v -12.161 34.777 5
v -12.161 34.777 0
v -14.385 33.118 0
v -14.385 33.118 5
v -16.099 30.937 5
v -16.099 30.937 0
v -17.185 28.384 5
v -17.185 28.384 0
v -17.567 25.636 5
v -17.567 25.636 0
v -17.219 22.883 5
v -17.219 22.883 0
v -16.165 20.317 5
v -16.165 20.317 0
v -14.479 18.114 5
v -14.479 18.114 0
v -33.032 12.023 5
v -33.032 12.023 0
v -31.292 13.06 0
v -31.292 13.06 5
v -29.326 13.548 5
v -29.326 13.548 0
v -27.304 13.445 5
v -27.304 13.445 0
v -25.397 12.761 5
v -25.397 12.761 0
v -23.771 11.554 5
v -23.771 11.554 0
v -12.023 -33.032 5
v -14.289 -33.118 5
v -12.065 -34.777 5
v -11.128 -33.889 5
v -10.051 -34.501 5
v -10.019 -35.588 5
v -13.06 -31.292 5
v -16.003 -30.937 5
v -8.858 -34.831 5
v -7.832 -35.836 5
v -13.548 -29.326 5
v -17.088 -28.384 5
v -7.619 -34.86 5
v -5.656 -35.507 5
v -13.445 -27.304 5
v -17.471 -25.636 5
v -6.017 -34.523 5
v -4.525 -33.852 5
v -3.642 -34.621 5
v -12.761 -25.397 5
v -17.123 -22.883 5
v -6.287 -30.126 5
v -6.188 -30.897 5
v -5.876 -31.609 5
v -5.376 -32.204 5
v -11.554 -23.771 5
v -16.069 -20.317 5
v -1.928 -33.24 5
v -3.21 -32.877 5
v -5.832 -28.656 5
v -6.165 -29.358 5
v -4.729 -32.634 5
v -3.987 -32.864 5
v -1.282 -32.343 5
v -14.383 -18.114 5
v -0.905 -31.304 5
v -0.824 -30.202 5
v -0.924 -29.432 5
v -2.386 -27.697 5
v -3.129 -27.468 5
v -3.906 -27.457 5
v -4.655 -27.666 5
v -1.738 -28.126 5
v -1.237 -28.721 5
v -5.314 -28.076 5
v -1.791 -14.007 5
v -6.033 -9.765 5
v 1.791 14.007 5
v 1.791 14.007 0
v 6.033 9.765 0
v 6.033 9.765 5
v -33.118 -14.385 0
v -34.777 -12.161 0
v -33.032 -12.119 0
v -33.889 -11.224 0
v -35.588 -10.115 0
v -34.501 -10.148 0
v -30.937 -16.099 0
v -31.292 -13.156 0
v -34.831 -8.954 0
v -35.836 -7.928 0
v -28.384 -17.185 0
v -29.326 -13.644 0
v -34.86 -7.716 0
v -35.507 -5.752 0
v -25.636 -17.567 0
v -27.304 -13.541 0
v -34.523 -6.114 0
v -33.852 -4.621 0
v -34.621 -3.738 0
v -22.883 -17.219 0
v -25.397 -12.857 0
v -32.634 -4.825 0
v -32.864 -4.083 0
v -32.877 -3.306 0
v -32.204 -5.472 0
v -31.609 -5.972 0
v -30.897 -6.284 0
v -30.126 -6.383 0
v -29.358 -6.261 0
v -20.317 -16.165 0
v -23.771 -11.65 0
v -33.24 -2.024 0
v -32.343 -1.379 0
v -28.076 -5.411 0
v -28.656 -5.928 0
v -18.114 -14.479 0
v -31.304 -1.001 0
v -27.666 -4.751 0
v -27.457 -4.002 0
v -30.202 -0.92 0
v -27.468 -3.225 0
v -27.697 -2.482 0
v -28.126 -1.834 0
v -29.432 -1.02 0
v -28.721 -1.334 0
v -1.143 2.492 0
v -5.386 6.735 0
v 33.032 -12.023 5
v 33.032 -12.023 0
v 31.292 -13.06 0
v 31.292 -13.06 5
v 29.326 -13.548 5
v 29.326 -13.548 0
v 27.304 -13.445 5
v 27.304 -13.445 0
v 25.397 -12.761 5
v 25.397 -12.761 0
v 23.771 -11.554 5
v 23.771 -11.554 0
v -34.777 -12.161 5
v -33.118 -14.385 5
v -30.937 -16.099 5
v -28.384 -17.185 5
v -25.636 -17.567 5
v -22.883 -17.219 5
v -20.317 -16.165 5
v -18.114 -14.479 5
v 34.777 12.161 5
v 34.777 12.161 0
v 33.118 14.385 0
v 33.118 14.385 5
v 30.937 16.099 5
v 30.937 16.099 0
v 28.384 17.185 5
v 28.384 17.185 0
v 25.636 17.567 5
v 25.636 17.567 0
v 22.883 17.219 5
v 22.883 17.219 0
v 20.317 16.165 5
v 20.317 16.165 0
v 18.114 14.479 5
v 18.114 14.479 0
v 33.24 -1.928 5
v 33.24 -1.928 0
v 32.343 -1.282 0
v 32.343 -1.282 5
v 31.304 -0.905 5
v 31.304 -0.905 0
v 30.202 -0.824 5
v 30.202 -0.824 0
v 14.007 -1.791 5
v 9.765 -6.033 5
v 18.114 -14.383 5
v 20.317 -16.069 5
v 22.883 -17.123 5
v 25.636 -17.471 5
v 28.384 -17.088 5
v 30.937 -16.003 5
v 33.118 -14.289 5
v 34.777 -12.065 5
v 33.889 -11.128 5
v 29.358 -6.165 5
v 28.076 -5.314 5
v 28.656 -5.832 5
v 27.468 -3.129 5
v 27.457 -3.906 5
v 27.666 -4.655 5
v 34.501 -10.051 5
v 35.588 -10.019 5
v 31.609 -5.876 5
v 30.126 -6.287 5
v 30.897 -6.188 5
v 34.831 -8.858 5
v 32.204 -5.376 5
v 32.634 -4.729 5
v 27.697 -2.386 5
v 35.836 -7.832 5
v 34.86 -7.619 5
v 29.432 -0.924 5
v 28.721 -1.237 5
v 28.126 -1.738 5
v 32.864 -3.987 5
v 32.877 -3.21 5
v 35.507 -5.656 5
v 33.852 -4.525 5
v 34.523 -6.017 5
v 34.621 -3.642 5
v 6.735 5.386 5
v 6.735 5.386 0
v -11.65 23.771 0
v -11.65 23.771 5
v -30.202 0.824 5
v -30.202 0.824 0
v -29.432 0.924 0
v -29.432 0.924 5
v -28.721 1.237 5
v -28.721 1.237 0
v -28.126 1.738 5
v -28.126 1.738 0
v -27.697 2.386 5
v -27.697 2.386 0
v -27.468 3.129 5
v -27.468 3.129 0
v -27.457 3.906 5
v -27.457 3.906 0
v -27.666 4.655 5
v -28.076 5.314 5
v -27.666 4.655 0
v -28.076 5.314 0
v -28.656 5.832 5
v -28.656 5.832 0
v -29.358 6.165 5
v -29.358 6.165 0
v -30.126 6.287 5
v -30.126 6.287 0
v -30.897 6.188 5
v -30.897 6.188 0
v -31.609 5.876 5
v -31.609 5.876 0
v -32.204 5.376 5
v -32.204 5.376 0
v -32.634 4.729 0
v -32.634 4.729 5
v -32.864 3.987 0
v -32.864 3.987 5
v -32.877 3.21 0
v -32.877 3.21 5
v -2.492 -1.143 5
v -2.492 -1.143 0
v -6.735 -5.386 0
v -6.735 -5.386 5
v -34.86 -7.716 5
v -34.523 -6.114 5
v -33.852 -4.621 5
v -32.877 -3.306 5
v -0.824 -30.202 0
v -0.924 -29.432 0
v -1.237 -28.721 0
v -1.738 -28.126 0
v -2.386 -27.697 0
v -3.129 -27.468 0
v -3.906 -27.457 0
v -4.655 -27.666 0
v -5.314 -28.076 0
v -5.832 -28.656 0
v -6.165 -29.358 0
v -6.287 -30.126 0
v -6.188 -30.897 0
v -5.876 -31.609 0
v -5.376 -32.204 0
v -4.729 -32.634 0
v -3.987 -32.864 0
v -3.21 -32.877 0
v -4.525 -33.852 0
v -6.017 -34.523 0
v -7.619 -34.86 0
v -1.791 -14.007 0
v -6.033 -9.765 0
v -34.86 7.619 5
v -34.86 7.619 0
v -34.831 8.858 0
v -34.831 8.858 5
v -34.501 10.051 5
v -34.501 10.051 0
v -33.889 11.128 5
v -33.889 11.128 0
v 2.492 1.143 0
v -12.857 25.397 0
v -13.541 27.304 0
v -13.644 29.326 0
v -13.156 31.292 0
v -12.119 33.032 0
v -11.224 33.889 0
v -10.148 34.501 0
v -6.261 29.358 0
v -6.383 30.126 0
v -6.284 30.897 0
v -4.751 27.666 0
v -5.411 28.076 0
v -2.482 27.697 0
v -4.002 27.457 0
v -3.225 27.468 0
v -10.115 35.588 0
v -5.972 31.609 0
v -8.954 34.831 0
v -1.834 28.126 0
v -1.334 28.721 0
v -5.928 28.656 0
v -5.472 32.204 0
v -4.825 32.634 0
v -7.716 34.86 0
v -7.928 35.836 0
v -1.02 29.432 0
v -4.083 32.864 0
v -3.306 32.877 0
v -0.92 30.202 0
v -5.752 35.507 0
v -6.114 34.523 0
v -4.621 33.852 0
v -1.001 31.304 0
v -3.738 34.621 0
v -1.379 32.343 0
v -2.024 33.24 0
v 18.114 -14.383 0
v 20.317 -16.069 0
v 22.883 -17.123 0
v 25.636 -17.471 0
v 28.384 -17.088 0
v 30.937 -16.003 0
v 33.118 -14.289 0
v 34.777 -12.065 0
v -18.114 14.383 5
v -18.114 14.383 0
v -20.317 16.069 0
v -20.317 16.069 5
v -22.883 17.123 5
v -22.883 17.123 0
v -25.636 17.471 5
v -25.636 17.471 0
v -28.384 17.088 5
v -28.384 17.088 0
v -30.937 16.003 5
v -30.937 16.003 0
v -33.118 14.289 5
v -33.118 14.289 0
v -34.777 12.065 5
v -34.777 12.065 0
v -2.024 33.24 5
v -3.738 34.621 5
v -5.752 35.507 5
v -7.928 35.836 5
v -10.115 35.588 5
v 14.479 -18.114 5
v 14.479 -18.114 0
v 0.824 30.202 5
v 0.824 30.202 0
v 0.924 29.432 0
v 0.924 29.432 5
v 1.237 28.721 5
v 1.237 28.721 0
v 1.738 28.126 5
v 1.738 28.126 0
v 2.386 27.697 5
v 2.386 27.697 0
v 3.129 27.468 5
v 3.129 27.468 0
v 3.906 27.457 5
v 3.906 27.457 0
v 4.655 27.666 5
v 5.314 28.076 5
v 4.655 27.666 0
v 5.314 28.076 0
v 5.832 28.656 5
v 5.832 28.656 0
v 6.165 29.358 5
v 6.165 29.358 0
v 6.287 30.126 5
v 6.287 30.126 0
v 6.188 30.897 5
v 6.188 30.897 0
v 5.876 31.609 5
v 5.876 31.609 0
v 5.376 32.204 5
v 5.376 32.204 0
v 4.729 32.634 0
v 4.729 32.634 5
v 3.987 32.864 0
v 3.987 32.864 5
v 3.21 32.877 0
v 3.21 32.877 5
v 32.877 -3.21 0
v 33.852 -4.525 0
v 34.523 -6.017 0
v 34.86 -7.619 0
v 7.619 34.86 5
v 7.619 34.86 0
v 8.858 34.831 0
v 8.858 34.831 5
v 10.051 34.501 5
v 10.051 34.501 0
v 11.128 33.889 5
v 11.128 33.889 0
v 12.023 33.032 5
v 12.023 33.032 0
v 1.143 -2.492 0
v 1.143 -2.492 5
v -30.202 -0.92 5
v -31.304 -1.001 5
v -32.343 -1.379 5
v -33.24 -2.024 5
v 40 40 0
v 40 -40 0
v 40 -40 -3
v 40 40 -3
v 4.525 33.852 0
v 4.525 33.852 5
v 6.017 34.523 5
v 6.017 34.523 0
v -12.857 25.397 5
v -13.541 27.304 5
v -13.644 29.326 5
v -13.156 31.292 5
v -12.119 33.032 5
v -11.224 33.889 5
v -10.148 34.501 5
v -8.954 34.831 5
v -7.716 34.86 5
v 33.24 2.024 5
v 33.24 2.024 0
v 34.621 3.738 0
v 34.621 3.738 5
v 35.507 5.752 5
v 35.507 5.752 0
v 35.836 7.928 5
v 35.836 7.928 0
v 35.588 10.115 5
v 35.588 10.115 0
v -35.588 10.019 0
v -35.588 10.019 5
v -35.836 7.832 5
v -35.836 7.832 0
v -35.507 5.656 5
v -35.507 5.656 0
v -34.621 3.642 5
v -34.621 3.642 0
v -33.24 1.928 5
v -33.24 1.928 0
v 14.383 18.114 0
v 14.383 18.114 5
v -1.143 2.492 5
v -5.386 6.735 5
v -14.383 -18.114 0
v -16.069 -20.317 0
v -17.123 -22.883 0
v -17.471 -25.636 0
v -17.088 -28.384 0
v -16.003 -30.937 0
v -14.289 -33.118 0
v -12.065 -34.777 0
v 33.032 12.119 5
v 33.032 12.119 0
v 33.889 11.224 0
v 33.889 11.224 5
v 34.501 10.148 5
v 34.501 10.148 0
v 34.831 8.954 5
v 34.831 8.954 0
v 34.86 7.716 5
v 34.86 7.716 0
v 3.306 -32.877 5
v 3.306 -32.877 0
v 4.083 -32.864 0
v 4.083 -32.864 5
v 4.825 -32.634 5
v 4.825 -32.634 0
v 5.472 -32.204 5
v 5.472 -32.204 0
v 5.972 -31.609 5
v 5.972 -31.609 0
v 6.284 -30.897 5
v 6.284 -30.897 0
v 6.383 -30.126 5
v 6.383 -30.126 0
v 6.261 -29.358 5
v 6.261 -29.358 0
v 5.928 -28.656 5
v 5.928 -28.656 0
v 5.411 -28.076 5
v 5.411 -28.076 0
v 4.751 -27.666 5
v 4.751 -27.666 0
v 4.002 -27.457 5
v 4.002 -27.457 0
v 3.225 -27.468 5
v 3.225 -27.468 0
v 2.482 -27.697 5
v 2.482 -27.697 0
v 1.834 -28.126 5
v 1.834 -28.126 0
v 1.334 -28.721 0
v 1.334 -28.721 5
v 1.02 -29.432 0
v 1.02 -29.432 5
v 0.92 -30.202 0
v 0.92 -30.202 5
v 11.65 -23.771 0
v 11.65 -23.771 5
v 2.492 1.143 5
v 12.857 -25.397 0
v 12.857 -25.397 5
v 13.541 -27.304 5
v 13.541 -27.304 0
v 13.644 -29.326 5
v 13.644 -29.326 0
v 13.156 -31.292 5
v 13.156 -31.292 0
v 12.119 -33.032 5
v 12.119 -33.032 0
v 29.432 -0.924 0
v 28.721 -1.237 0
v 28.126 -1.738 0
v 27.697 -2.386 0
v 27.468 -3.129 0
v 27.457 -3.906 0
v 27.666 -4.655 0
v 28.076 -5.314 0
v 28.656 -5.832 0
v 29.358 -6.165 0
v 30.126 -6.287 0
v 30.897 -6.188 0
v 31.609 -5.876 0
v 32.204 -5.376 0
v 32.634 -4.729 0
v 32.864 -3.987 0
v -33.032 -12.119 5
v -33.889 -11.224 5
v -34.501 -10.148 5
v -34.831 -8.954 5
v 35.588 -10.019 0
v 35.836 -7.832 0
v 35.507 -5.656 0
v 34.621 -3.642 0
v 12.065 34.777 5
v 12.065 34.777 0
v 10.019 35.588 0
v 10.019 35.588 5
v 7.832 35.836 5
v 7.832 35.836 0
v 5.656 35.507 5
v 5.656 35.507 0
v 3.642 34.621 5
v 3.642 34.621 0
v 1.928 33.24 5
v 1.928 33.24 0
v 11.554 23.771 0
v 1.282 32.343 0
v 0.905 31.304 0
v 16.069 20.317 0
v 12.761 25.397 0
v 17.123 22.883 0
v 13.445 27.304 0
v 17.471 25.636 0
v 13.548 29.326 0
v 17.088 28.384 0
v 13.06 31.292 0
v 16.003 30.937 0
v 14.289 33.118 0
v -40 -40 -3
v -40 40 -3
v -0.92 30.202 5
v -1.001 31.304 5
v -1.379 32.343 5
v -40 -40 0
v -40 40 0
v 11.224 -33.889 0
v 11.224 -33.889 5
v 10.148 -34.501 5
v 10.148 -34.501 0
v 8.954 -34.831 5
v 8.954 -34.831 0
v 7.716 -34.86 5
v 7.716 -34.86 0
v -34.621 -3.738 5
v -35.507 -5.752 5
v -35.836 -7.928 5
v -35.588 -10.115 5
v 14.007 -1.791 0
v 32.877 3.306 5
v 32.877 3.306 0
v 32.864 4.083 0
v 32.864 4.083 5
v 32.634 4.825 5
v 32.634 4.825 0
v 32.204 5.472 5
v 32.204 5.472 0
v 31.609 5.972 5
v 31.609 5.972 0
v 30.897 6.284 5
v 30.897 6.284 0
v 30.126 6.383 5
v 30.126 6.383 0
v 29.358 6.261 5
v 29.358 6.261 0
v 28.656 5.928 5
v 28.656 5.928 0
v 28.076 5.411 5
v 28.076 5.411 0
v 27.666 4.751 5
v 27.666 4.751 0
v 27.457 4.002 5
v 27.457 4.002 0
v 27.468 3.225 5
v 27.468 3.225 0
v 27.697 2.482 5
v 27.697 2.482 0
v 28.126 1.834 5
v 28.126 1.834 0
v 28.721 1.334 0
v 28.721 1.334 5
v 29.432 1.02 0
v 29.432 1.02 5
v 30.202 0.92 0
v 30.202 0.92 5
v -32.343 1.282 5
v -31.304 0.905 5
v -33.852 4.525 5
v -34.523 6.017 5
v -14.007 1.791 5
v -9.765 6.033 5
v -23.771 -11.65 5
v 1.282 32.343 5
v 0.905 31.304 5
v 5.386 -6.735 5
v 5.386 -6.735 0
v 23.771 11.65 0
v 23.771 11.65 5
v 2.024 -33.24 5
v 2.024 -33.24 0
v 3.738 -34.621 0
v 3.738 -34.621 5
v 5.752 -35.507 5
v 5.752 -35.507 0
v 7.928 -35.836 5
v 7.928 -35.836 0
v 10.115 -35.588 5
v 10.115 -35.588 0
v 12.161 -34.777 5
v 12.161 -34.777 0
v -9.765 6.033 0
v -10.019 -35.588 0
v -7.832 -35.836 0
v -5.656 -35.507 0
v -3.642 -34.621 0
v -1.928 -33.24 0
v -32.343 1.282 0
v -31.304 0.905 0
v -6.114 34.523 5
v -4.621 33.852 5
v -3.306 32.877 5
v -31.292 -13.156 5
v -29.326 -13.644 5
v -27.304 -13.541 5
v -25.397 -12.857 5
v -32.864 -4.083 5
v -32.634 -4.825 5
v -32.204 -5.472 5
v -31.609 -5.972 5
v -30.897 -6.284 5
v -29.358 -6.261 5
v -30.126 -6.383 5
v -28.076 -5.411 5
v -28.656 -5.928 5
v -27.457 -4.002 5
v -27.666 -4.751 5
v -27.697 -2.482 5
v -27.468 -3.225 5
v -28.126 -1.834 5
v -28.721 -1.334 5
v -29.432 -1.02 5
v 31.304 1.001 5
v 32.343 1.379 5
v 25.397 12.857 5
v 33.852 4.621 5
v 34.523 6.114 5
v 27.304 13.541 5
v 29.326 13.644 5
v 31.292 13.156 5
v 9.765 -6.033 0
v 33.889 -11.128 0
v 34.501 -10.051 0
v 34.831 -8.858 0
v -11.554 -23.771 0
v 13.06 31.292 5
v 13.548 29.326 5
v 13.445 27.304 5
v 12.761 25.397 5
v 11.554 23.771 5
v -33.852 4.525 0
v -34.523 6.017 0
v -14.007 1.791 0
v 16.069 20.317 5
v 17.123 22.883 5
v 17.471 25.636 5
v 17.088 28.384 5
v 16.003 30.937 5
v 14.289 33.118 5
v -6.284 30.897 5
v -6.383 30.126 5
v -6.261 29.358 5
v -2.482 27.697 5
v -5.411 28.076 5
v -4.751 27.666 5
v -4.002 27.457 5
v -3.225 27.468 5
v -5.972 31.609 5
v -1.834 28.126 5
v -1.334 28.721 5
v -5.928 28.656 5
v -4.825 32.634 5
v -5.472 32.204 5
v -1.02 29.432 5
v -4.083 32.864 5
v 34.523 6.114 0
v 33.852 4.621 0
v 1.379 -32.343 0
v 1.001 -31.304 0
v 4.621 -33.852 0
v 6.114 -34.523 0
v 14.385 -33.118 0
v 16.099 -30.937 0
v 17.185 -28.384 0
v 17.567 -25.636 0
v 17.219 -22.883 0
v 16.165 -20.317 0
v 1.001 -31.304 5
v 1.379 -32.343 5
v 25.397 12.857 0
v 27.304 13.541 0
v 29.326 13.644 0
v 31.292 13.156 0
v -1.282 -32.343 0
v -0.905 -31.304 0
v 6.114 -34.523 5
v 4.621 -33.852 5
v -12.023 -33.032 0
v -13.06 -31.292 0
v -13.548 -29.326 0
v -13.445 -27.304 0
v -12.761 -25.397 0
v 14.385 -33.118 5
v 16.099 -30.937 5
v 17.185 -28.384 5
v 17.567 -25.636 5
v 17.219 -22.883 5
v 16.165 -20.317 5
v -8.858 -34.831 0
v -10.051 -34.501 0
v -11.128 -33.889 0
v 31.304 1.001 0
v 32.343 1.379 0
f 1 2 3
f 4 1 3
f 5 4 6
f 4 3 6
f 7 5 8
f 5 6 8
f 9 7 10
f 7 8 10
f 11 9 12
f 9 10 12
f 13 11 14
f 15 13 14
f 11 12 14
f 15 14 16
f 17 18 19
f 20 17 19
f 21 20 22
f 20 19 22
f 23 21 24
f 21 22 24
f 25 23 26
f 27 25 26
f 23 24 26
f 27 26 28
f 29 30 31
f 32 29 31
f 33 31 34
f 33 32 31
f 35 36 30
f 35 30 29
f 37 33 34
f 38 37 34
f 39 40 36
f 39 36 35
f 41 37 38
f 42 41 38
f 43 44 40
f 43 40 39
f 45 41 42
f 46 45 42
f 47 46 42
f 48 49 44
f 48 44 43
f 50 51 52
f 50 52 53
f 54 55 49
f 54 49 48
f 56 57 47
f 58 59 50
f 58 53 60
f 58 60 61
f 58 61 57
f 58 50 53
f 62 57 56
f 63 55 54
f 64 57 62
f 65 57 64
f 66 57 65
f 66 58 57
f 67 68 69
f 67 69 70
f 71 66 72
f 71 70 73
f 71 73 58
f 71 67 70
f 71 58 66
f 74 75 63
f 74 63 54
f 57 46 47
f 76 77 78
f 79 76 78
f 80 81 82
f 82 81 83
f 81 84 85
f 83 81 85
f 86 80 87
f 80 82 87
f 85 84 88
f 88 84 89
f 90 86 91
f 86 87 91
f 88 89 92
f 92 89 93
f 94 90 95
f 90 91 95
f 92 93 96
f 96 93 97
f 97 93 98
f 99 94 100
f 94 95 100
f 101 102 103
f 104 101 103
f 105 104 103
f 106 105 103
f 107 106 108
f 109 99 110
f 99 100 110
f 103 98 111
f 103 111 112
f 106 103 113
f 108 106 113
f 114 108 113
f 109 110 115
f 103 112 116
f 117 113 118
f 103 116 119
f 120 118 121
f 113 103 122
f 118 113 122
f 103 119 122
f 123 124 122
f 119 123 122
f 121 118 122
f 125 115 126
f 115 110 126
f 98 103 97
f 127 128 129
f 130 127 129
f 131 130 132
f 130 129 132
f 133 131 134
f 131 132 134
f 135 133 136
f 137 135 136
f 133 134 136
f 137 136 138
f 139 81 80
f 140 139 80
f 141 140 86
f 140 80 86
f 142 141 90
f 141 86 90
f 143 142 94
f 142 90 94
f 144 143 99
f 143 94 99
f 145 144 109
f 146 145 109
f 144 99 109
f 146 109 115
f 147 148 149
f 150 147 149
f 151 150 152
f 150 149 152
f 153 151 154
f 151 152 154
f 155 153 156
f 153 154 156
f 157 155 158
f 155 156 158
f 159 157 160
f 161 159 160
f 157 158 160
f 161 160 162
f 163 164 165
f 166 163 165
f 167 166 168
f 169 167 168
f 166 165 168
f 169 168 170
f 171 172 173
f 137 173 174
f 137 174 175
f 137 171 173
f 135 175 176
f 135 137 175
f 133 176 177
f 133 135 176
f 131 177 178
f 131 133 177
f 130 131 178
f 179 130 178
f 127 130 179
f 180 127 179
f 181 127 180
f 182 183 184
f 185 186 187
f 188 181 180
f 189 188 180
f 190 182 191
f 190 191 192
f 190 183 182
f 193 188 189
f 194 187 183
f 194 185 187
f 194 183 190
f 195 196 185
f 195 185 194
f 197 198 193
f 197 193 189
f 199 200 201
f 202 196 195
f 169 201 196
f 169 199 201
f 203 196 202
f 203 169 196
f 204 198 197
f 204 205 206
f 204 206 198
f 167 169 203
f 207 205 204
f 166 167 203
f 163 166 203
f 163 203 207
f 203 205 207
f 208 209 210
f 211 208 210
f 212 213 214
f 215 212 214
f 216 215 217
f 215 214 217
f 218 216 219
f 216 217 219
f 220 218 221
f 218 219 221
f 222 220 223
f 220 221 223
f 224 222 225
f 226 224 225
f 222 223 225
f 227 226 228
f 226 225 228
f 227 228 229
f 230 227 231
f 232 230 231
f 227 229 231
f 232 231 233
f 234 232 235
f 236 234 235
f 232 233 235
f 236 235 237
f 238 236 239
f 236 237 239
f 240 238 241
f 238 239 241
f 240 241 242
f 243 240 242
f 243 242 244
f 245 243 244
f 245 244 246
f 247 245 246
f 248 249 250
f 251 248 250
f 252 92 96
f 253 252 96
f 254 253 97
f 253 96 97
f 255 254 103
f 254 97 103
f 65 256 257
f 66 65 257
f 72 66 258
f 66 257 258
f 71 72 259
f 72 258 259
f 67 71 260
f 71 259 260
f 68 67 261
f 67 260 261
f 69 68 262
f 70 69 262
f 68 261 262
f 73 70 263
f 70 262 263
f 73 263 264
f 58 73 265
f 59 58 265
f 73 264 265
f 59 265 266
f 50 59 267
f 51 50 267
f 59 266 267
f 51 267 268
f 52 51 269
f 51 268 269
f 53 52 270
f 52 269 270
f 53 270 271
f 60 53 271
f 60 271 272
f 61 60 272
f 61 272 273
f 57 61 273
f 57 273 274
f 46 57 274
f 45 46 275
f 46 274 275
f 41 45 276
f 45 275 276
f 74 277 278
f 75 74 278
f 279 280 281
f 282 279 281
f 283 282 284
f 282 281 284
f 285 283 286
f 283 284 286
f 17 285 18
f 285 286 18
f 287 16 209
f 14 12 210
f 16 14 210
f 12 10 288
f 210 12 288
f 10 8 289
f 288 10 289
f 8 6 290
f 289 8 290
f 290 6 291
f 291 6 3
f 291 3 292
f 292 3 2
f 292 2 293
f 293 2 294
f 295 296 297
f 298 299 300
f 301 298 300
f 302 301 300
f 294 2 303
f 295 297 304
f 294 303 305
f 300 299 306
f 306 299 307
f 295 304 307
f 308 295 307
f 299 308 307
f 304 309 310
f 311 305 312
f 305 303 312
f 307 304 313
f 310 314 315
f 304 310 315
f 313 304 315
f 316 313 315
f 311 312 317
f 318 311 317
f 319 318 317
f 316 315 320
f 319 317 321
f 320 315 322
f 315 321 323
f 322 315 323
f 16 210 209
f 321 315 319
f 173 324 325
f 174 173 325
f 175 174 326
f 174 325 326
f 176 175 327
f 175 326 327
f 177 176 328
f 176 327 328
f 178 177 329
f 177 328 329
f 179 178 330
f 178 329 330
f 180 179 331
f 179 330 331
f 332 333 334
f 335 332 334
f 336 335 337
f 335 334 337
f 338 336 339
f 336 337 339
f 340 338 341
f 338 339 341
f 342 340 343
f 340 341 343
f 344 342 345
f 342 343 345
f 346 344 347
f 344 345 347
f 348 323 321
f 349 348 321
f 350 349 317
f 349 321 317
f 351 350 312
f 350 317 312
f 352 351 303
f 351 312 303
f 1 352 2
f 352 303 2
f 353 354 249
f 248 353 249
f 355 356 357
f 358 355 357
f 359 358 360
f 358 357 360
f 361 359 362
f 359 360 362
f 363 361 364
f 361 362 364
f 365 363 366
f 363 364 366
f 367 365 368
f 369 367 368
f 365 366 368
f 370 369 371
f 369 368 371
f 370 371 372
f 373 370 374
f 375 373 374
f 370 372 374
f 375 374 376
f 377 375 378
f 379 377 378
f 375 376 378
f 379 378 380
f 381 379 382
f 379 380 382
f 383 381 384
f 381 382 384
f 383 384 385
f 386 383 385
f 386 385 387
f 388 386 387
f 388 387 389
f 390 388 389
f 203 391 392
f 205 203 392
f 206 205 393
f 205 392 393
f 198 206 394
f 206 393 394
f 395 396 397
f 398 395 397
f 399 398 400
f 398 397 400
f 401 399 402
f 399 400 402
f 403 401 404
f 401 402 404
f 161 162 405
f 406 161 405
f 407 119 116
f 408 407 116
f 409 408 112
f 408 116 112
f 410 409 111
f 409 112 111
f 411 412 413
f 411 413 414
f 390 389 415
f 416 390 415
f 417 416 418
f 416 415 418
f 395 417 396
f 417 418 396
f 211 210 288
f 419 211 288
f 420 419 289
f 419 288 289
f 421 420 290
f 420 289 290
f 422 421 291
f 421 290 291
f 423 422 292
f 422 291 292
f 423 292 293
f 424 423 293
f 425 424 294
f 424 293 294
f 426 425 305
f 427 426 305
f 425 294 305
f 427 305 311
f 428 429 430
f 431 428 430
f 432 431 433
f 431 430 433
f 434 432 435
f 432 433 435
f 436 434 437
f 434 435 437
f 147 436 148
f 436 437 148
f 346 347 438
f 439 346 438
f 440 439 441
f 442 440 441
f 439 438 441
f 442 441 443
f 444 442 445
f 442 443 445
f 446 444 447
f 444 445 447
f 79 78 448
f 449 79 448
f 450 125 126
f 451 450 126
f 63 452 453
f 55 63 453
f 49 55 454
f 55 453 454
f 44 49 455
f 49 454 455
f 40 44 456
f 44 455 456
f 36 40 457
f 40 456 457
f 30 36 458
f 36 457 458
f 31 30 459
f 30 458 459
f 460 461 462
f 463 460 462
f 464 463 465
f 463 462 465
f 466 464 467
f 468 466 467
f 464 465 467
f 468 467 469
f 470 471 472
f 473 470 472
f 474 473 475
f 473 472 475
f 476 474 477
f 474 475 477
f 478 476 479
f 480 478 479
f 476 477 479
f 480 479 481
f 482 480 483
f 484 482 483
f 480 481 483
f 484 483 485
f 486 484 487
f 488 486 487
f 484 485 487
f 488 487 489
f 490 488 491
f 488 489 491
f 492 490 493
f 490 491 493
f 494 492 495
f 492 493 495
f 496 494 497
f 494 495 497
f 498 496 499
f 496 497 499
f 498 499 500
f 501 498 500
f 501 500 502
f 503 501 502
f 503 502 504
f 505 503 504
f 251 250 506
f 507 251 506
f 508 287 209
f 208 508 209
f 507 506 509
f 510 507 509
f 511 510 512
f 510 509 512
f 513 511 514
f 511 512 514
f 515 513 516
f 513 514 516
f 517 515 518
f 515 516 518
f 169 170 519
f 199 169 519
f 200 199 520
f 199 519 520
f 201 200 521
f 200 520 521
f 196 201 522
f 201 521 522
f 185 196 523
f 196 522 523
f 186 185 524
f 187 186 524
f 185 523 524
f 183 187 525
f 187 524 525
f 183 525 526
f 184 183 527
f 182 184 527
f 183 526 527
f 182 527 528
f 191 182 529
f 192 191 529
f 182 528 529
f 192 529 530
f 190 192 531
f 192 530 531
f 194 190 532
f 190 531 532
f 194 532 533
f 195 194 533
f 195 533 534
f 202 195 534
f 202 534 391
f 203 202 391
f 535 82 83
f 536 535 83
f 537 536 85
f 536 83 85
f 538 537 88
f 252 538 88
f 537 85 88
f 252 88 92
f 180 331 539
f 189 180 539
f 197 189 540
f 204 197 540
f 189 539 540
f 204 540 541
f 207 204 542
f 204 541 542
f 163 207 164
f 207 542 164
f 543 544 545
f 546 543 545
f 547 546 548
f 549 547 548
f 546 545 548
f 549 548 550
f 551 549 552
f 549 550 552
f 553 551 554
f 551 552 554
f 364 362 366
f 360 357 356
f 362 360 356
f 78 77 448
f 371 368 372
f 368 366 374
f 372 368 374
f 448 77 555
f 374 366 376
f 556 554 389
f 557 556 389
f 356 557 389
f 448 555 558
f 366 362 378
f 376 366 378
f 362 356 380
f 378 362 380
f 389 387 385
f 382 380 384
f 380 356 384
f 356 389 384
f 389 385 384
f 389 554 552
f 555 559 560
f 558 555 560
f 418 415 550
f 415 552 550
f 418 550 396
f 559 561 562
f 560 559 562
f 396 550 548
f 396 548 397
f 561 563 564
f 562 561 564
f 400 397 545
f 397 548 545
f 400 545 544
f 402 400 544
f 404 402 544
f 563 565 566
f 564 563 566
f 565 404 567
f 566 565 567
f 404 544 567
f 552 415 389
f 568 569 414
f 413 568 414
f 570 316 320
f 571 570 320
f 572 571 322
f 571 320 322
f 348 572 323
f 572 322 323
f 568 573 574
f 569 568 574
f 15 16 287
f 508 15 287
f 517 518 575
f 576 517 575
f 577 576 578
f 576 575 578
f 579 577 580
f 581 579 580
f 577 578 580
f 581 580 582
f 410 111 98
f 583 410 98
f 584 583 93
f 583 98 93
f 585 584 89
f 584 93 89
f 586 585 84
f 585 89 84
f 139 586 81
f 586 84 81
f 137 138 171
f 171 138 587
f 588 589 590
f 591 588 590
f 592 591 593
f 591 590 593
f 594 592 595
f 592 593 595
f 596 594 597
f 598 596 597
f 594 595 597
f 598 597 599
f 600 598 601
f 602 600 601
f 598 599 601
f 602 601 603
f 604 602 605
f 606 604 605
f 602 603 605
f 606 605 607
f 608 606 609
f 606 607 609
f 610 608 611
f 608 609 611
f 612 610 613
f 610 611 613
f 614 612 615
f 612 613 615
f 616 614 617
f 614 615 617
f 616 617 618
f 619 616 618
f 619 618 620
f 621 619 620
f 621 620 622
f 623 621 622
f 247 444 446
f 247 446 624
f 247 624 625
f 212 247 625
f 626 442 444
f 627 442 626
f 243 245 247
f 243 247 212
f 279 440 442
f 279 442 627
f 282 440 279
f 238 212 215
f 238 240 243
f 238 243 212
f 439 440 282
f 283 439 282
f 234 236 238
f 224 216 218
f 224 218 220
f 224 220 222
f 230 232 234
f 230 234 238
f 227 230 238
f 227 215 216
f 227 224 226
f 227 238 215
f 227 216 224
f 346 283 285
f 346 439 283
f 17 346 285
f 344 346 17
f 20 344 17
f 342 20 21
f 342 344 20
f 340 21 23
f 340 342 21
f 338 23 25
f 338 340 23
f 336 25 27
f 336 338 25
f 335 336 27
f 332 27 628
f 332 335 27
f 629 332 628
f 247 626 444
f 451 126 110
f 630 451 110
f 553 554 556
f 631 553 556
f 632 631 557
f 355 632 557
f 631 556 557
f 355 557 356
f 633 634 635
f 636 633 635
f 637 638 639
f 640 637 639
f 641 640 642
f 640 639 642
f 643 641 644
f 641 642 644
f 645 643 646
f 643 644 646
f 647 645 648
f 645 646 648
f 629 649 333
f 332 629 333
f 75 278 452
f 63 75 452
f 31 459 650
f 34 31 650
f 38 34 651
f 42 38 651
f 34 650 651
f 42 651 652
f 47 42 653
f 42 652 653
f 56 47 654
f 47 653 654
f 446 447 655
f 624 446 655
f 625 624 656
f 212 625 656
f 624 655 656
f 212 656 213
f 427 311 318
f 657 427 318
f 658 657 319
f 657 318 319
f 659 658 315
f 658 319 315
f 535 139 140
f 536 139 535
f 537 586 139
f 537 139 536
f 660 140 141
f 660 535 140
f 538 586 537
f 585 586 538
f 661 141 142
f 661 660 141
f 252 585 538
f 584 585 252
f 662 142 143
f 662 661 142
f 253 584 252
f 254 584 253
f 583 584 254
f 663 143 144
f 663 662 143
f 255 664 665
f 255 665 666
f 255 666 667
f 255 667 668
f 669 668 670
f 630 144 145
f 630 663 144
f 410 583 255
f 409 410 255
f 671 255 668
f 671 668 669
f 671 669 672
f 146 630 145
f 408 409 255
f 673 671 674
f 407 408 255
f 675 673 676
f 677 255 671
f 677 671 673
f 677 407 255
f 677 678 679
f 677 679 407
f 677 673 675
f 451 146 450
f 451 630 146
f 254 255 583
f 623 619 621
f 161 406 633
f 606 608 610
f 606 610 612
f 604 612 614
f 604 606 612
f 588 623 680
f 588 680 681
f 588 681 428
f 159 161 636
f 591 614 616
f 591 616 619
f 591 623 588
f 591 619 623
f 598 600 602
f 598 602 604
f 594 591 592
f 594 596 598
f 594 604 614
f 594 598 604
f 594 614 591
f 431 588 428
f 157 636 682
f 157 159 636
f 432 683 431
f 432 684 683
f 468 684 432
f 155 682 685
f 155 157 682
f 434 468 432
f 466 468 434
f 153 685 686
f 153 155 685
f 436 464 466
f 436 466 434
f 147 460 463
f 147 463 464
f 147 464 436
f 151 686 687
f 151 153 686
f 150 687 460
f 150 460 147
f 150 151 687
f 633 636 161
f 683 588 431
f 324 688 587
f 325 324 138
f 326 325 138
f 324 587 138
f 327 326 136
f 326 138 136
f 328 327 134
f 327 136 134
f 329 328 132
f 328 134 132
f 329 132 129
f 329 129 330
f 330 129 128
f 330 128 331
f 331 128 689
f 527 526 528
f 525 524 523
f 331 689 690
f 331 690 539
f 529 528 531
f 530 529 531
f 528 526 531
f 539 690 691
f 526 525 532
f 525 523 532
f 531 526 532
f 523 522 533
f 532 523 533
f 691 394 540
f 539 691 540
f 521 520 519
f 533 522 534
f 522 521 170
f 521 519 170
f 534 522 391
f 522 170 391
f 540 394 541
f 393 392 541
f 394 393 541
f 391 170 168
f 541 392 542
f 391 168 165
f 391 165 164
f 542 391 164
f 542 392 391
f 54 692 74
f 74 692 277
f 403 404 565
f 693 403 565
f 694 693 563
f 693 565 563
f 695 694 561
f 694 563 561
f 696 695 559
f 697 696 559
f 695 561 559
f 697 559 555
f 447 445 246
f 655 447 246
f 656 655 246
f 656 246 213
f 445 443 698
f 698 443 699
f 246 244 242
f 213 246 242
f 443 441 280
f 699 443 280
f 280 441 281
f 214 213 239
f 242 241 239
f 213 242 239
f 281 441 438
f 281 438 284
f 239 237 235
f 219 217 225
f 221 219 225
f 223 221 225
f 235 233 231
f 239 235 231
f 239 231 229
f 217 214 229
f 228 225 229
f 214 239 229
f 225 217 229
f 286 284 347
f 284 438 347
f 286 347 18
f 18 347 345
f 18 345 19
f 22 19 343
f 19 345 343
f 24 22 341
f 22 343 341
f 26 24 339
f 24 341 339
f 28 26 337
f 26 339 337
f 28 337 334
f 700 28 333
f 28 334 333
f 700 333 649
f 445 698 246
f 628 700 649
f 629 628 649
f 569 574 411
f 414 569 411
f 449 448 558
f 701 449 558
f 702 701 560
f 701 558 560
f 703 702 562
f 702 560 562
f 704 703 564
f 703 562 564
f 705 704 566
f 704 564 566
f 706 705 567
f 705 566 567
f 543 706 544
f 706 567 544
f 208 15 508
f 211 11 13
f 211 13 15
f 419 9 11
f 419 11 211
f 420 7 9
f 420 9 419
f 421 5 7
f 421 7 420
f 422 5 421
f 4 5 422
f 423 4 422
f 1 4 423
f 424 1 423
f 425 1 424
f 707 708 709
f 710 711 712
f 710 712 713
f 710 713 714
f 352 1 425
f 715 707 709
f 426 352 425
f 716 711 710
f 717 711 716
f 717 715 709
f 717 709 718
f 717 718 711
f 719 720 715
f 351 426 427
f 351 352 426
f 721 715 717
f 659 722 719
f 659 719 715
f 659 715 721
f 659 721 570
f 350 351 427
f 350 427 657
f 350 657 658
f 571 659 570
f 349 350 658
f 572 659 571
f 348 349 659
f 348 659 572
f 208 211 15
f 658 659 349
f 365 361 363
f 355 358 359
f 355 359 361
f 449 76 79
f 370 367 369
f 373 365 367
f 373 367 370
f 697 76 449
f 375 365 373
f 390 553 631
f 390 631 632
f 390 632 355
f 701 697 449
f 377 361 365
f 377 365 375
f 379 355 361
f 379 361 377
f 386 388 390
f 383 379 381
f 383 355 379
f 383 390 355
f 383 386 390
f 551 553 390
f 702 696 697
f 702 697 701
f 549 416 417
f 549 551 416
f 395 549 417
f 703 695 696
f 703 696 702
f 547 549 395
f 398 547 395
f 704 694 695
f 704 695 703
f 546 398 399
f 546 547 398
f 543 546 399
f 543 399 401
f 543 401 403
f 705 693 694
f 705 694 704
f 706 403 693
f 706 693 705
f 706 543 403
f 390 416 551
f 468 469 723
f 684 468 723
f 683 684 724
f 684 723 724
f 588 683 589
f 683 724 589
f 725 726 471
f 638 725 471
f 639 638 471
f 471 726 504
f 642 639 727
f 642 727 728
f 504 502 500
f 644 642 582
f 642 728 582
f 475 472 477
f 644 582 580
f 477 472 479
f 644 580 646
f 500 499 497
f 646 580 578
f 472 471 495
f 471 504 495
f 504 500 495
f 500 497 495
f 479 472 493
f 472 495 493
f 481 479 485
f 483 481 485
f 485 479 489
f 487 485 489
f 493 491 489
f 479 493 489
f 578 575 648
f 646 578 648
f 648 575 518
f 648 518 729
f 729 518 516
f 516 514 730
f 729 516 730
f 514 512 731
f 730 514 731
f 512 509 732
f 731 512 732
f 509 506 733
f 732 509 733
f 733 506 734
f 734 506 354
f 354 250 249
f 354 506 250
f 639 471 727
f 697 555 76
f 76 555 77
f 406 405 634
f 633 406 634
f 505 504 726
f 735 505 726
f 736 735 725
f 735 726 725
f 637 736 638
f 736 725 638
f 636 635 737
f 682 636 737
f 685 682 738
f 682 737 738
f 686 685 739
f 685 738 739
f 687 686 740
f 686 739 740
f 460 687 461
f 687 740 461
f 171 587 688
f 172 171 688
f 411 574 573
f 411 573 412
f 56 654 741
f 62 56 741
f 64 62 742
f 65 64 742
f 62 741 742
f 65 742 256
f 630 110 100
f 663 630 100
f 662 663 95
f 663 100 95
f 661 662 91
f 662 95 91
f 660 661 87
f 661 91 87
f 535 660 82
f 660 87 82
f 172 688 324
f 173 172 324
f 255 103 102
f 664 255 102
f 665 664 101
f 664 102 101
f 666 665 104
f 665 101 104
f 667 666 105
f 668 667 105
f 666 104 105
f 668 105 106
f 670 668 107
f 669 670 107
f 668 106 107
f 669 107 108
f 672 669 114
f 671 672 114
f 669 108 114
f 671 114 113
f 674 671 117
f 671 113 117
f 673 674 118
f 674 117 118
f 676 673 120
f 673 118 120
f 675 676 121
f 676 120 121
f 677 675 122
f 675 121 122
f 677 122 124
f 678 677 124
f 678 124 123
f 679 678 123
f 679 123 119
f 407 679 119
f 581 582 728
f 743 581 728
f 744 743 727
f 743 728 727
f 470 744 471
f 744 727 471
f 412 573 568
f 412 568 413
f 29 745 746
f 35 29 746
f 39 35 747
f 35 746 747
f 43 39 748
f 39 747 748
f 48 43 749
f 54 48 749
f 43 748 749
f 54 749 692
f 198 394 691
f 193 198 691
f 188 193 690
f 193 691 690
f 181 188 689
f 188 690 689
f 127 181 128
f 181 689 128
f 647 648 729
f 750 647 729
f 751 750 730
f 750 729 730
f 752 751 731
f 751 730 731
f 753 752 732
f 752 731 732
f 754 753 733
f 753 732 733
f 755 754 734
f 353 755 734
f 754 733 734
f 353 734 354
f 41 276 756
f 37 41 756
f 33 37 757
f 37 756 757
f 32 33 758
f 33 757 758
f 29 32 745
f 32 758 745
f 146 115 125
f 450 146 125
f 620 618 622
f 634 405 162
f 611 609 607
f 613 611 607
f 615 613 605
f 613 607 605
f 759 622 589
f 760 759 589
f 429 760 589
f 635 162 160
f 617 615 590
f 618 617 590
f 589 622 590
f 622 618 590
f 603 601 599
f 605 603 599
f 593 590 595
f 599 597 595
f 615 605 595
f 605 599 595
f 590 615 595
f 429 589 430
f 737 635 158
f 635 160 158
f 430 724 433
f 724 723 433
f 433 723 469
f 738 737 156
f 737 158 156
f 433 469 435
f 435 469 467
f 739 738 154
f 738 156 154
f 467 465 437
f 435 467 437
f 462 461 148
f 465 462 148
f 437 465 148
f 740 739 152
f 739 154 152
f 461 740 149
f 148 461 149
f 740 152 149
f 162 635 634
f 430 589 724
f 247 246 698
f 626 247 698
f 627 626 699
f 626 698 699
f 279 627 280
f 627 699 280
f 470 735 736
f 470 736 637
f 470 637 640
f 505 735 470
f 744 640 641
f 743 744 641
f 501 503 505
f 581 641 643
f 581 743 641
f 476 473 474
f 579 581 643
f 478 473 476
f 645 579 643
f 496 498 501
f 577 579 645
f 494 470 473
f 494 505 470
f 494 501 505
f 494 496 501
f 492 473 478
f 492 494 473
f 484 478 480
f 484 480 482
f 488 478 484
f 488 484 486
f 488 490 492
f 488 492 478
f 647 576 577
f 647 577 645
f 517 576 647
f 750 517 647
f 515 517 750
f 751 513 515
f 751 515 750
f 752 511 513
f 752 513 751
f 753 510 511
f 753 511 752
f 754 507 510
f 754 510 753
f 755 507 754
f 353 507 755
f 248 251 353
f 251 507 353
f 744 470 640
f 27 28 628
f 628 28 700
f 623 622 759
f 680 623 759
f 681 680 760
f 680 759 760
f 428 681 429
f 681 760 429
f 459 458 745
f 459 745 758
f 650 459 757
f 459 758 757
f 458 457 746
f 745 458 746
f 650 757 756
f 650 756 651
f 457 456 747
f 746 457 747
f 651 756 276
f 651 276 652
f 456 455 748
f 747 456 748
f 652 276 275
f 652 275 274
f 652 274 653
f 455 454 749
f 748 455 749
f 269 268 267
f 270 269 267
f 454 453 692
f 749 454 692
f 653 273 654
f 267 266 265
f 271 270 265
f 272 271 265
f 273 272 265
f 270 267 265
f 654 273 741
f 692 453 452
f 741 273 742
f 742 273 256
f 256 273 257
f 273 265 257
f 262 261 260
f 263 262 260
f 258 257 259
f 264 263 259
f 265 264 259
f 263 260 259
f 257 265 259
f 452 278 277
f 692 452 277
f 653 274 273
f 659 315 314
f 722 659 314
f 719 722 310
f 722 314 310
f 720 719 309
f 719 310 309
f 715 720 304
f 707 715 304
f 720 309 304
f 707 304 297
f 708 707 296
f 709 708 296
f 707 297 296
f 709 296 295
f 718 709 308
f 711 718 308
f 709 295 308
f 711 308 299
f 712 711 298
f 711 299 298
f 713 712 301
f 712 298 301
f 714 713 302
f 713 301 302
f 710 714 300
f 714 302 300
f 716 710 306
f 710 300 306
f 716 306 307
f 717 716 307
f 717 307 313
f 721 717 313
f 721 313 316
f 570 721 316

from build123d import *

# Parameters (mm, degrees)
F1_DEPTH = 5
F2_W     = 80
F2_H     = 80
F3_DEPTH = 3


with BuildPart() as f1:
    # F0 (on Top) → F1 (new body)
    with BuildSketch(Plane.XY):
        with BuildLine():
            ThreePointArc((-33.032427, 12.023266), (-28.311256, 13.570947), (-23.770654, 11.554089))
            Line((-23.770654, 11.554089), (-14.007332, 1.790769))
            Line((-14.007332, 1.790769), (-9.764692, 6.03341))
            Line((-9.764692, 6.03341), (-18.1138, 14.382517))
            ThreePointArc((-18.1138, 14.382517), (-27.022283, 17.370307), (-34.77726, 12.064813))
            ThreePointArc((-34.77726, 12.064813), (-35.743344, 6.733199), (-33.240146, 1.927638))
            ThreePointArc((-33.240146, 1.927638), (-31.836686, 1.058028), (-30.202384, 0.823556))
            ThreePointArc((-30.202384, 0.823556), (-28.347924, 5.593811), (-32.876673, 3.209532))
            ThreePointArc((-32.876673, 3.209532), (-34.227678, 5.25291), (-34.860349, 7.619412))
            ThreePointArc((-34.860349, 7.619412), (-34.500658, 10.051402), (-33.032427, 12.023266))
        make_face()
        with BuildLine():
            Line((-18.1138, -14.47863), (-1.143236, 2.49193))
            Line((-1.143236, 2.49193), (-5.385876, 6.734572))
            Line((-5.385876, 6.734572), (-23.770654, -11.650202))
            ThreePointArc((-23.770654, -11.650202), (-28.311256, -13.667061), (-33.032427, -12.11938))
            ThreePointArc((-33.032427, -12.11938), (-34.500658, -10.147515), (-34.860349, -7.715526))
            ThreePointArc((-34.860349, -7.715526), (-34.227678, -5.349024), (-32.876673, -3.305645))
            ThreePointArc((-32.876673, -3.305645), (-28.347924, -5.689925), (-30.202384, -0.919669))
            ThreePointArc((-30.202384, -0.919669), (-31.836686, -1.154141), (-33.240146, -2.023752))
            ThreePointArc((-33.240146, -2.023752), (-35.743344, -6.829313), (-34.77726, -12.160926))
            ThreePointArc((-34.77726, -12.160926), (-27.022283, -17.466421), (-18.1138, -14.47863))
        make_face()
        with BuildLine():
            ThreePointArc((-12.023266, -33.032427), (-13.570947, -28.311256), (-11.554089, -23.770654))
            Line((-11.554089, -23.770654), (-1.790769, -14.007332))
            Line((-1.790769, -14.007332), (-6.03341, -9.764692))
            Line((-6.03341, -9.764692), (-14.382517, -18.1138))
            ThreePointArc((-14.382517, -18.1138), (-17.370307, -27.022283), (-12.064813, -34.77726))
            ThreePointArc((-12.064813, -34.77726), (-6.733199, -35.743344), (-1.927638, -33.240146))
            ThreePointArc((-1.927638, -33.240146), (-1.058028, -31.836686), (-0.823556, -30.202384))
            ThreePointArc((-0.823556, -30.202384), (-5.593811, -28.347924), (-3.209532, -32.876673))
            ThreePointArc((-3.209532, -32.876673), (-5.25291, -34.227678), (-7.619412, -34.860349))
            ThreePointArc((-7.619412, -34.860349), (-10.051402, -34.500658), (-12.023266, -33.032427))
        make_face()
        with BuildLine():
            Line((14.47863, -18.1138), (-2.49193, -1.143236))
            Line((-2.49193, -1.143236), (-6.734572, -5.385876))
            Line((-6.734572, -5.385876), (11.650202, -23.770654))
            ThreePointArc((11.650202, -23.770654), (13.667061, -28.311256), (12.11938, -33.032427))
            ThreePointArc((12.11938, -33.032427), (10.147515, -34.500658), (7.715526, -34.860349))
            ThreePointArc((7.715526, -34.860349), (5.349024, -34.227678), (3.305645, -32.876673))
            ThreePointArc((3.305645, -32.876673), (5.689925, -28.347924), (0.919669, -30.202384))
            ThreePointArc((0.919669, -30.202384), (1.154141, -31.836686), (2.023752, -33.240146))
            ThreePointArc((2.023752, -33.240146), (6.829313, -35.743344), (12.160926, -34.77726))
            ThreePointArc((12.160926, -34.77726), (17.466421, -27.022283), (14.47863, -18.1138))
        make_face()
        with BuildLine():
            ThreePointArc((33.032427, -12.023266), (28.311256, -13.570947), (23.770654, -11.554089))
            Line((23.770654, -11.554089), (14.007332, -1.790769))
            Line((14.007332, -1.790769), (9.764692, -6.03341))
            Line((9.764692, -6.03341), (18.1138, -14.382517))
            ThreePointArc((18.1138, -14.382517), (27.022283, -17.370307), (34.77726, -12.064813))
            ThreePointArc((34.77726, -12.064813), (35.743344, -6.733199), (33.240146, -1.927638))
            ThreePointArc((33.240146, -1.927638), (31.836686, -1.058028), (30.202384, -0.823556))
            ThreePointArc((30.202384, -0.823556), (28.347924, -5.593811), (32.876673, -3.209532))
            ThreePointArc((32.876673, -3.209532), (34.227678, -5.25291), (34.860349, -7.619412))
            ThreePointArc((34.860349, -7.619412), (34.500658, -10.051402), (33.032427, -12.023266))
        make_face()
        with BuildLine():
            Line((18.1138, 14.47863), (1.143236, -2.49193))
            Line((1.143236, -2.49193), (5.385876, -6.734572))
            Line((5.385876, -6.734572), (23.770654, 11.650202))
            ThreePointArc((23.770654, 11.650202), (28.311256, 13.667061), (33.032427, 12.11938))
            ThreePointArc((33.032427, 12.11938), (34.500658, 10.147515), (34.860349, 7.715526))
            ThreePointArc((34.860349, 7.715526), (34.227678, 5.349024), (32.876673, 3.305645))
            ThreePointArc((32.876673, 3.305645), (28.347924, 5.689925), (30.202384, 0.919669))
            ThreePointArc((30.202384, 0.919669), (31.836686, 1.154141), (33.240146, 2.023752))
            ThreePointArc((33.240146, 2.023752), (35.743344, 6.829313), (34.77726, 12.160926))
            ThreePointArc((34.77726, 12.160926), (27.022283, 17.466421), (18.1138, 14.47863))
        make_face()
        with BuildLine():
            ThreePointArc((12.023266, 33.032427), (13.570947, 28.311256), (11.554089, 23.770654))
            Line((11.554089, 23.770654), (1.790769, 14.007332))
            Line((1.790769, 14.007332), (6.03341, 9.764692))
            Line((6.03341, 9.764692), (14.382517, 18.1138))
            ThreePointArc((14.382517, 18.1138), (17.370307, 27.022283), (12.064813, 34.77726))
            ThreePointArc((12.064813, 34.77726), (6.733199, 35.743344), (1.927638, 33.240146))
            ThreePointArc((1.927638, 33.240146), (1.058028, 31.836686), (0.823556, 30.202384))
            ThreePointArc((0.823556, 30.202384), (5.593811, 28.347924), (3.209532, 32.876673))
            ThreePointArc((3.209532, 32.876673), (5.25291, 34.227678), (7.619412, 34.860349))
            ThreePointArc((7.619412, 34.860349), (10.051402, 34.500658), (12.023266, 33.032427))
        make_face()
        with BuildLine():
            Line((-14.47863, 18.1138), (2.49193, 1.143236))
            Line((2.49193, 1.143236), (6.734572, 5.385876))
            Line((6.734572, 5.385876), (-11.650202, 23.770654))
            ThreePointArc((-11.650202, 23.770654), (-13.667061, 28.311256), (-12.11938, 33.032427))
            ThreePointArc((-12.11938, 33.032427), (-10.147515, 34.500658), (-7.715526, 34.860349))
            ThreePointArc((-7.715526, 34.860349), (-5.349024, 34.227678), (-3.305645, 32.876673))
            ThreePointArc((-3.305645, 32.876673), (-5.689925, 28.347924), (-0.919669, 30.202384))
            ThreePointArc((-0.919669, 30.202384), (-1.154141, 31.836686), (-2.023752, 33.240146))
            ThreePointArc((-2.023752, 33.240146), (-6.829313, 35.743344), (-12.160926, 34.77726))
            ThreePointArc((-12.160926, 34.77726), (-17.466421, 27.022283), (-14.47863, 18.1138))
        make_face()
    extrude(amount=F1_DEPTH)


with BuildPart() as f3:
    # F2 (on Top) → F3 (new body)
    with BuildSketch(Plane.XY):
        Rectangle(F2_W, F2_H)
    extrude(amount=-F3_DEPTH)


solid = Compound([f1.part, f3.part])
